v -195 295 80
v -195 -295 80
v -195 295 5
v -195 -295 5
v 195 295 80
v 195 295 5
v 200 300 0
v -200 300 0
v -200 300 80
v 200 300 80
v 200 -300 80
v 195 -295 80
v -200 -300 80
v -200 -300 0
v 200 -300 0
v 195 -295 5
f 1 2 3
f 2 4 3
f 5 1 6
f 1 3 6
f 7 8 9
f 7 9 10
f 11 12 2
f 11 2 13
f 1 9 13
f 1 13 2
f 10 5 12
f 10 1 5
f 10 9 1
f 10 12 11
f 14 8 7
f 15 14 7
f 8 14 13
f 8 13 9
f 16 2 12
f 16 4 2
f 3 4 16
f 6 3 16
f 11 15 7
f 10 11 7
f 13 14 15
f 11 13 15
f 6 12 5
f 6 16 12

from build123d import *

# Parameters (mm, degrees)
F0_W     = 400
F0_H     = 600
F1_DEPTH = 80
F2_T     = -5


with BuildPart() as f1:
    # F0 (on Top) → F1 (new body)
    with BuildSketch(Plane.XY):
        Rectangle(F0_W, F0_H)
    extrude(amount=F1_DEPTH)

    # F2
    f2_openings = [f1.faces().sort_by_distance(p)[0] for p in [
        (0, 0, 80),
    ]]
    offset(amount=F2_T, openings=f2_openings)


with BuildPart() as f3_1:
    # F3: copy of F1
    add(f1.part.moved(Location((0, 0, 90))))


solid = f1.part
